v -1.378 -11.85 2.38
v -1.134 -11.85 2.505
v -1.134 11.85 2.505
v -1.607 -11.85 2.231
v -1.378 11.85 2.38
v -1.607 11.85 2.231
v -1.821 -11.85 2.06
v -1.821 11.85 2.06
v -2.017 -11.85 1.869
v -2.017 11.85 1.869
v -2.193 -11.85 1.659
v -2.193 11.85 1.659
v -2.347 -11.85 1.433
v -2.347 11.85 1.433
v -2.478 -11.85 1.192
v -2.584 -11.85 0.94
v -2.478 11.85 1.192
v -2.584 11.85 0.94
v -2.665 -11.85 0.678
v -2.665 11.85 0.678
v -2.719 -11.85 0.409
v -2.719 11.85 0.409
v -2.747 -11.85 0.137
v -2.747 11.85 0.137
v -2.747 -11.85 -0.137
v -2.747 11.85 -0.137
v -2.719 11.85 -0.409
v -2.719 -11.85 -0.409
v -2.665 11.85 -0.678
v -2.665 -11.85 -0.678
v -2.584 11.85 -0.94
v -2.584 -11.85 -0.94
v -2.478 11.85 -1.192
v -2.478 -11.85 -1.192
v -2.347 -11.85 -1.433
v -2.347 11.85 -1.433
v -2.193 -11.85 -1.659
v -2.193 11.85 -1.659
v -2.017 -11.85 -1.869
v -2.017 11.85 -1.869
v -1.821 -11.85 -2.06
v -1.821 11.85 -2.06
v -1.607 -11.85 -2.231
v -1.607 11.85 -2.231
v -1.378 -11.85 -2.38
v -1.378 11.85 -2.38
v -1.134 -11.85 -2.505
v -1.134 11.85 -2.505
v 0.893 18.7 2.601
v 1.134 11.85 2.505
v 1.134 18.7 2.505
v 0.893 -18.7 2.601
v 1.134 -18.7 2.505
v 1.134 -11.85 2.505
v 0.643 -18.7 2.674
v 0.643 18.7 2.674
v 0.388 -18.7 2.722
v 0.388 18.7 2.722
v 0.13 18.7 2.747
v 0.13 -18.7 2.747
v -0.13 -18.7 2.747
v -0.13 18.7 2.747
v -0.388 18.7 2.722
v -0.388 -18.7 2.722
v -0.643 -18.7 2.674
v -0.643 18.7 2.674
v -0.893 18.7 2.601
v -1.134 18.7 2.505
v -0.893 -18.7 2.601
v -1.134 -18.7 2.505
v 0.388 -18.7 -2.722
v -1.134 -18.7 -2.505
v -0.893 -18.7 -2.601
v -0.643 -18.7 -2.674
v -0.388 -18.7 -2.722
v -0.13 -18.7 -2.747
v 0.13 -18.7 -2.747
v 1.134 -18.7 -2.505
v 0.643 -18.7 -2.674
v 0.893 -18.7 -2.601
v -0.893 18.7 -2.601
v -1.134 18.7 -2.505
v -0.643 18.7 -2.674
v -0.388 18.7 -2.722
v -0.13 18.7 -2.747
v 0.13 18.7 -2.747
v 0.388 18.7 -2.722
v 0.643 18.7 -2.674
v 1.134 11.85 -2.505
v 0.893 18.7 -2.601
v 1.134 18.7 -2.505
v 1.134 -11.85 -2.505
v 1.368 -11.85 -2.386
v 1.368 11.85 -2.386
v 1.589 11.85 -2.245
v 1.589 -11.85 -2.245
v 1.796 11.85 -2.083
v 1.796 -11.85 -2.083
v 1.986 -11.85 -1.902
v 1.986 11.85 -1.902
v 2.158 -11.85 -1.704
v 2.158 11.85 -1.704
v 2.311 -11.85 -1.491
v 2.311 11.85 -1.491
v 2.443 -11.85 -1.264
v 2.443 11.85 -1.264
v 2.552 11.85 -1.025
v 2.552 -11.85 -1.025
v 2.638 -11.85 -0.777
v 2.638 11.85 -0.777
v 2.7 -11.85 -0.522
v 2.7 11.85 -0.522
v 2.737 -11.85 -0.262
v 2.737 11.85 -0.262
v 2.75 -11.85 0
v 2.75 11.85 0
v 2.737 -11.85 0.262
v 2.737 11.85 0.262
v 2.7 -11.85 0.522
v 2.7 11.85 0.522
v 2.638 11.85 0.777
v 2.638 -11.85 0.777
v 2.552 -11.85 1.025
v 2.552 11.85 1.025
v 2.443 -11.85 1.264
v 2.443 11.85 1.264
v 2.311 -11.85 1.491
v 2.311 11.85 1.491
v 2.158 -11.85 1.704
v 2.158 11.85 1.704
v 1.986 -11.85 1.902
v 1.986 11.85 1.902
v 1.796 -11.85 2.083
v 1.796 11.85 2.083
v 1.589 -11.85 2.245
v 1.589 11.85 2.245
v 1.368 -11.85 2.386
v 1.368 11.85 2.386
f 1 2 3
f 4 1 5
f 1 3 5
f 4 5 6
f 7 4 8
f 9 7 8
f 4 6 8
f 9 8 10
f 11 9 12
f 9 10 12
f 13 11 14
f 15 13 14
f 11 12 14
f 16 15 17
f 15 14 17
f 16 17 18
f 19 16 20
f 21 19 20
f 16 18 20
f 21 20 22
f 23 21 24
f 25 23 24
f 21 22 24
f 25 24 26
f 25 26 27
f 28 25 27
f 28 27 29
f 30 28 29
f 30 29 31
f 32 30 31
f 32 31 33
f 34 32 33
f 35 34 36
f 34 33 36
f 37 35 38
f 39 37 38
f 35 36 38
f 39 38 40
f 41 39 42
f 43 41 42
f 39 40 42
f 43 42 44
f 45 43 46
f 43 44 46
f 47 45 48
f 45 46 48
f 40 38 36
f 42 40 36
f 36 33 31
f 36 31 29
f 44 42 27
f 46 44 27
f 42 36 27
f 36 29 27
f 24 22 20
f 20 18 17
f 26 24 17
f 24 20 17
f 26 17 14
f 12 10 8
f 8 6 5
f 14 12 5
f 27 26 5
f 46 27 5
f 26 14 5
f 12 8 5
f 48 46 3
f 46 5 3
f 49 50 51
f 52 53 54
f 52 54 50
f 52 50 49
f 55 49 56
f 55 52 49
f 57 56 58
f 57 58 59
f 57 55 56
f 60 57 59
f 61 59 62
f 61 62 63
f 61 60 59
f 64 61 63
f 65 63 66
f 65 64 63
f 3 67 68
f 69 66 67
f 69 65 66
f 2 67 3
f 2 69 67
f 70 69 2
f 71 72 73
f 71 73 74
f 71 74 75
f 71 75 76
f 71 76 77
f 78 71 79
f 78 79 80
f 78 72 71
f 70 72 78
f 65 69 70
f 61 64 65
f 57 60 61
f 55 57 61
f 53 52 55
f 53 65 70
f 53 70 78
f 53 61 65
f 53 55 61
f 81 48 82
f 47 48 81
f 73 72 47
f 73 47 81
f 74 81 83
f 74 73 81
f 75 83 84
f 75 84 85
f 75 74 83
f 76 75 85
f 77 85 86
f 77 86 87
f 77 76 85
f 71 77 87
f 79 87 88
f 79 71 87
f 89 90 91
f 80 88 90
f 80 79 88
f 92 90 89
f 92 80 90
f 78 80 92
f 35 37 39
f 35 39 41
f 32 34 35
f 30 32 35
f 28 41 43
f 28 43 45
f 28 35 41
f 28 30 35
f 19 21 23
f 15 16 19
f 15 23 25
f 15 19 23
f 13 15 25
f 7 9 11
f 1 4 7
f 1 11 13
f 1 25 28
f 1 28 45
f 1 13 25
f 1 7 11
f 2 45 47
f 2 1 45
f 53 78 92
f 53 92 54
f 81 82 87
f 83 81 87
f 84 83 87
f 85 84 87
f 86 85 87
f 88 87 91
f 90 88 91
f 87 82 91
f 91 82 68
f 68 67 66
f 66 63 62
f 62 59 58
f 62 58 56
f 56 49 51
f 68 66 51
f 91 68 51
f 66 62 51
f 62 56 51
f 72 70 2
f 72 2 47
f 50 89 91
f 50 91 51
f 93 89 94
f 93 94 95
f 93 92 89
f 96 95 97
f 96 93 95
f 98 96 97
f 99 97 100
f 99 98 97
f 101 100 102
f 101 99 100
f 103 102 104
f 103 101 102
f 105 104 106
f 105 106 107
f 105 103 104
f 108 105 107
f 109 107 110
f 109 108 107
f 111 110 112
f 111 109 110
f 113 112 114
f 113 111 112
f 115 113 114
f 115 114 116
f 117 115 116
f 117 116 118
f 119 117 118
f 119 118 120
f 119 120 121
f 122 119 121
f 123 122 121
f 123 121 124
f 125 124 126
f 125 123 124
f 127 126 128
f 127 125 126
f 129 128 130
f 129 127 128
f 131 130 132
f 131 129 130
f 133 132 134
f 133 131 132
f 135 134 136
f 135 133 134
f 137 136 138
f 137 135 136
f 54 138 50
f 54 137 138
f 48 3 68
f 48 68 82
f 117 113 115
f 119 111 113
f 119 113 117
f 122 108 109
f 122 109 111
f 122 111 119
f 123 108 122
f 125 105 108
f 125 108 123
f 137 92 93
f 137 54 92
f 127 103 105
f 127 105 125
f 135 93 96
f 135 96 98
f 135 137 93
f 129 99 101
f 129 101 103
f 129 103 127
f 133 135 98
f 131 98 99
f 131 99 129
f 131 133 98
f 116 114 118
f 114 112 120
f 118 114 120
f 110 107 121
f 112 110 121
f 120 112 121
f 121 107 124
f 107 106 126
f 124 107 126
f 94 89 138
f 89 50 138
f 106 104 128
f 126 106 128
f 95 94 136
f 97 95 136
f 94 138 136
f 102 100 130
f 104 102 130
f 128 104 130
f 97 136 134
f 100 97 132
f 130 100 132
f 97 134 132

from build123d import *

# Parameters (mm, degrees)
F1_DEPTH = 18.7
F2_DEPTH = 11.85


with BuildPart() as f1:
    # F0 (on Front) → F1 (new body, symmetric)
    with BuildSketch(Plane.XZ):
        with BuildLine():
            Line((1.1339226358, -2.5053381919), (1.1339226358, 2.5053381919))
            ThreePointArc((1.1339226358, 2.5053381919), (0, 2.75), (-1.1339226358, 2.5053381919))
            Line((-1.1339226358, 2.5053381919), (-1.1339226358, -2.5053381919))
            ThreePointArc((-1.1339226358, -2.5053381919), (0, -2.75), (1.1339226358, -2.5053381919))
        make_face()
    extrude(amount=F1_DEPTH, both=True)

    # F0 (on Front) → F2 (join, symmetric)
    with BuildSketch(Plane.XZ):
        with BuildLine():
            Line((-1.1339226358, -2.5053381919), (-1.1339226358, 2.5053381919))
            ThreePointArc((-1.1339226358, 2.5053381919), (-2.75, 0), (-1.1339226358, -2.5053381919))
        make_face()
        with BuildLine():
            ThreePointArc((1.1339226358, -2.5053381919), (2.310929169, -1.4906731284), (2.75, 0))
            ThreePointArc((2.75, 0), (2.310929169, 1.4906731284), (1.1339226358, 2.5053381919))
            Line((1.1339226358, 2.5053381919), (1.1339226358, -2.5053381919))
        make_face()
    extrude(amount=F2_DEPTH, both=True)


solid = f1.part
